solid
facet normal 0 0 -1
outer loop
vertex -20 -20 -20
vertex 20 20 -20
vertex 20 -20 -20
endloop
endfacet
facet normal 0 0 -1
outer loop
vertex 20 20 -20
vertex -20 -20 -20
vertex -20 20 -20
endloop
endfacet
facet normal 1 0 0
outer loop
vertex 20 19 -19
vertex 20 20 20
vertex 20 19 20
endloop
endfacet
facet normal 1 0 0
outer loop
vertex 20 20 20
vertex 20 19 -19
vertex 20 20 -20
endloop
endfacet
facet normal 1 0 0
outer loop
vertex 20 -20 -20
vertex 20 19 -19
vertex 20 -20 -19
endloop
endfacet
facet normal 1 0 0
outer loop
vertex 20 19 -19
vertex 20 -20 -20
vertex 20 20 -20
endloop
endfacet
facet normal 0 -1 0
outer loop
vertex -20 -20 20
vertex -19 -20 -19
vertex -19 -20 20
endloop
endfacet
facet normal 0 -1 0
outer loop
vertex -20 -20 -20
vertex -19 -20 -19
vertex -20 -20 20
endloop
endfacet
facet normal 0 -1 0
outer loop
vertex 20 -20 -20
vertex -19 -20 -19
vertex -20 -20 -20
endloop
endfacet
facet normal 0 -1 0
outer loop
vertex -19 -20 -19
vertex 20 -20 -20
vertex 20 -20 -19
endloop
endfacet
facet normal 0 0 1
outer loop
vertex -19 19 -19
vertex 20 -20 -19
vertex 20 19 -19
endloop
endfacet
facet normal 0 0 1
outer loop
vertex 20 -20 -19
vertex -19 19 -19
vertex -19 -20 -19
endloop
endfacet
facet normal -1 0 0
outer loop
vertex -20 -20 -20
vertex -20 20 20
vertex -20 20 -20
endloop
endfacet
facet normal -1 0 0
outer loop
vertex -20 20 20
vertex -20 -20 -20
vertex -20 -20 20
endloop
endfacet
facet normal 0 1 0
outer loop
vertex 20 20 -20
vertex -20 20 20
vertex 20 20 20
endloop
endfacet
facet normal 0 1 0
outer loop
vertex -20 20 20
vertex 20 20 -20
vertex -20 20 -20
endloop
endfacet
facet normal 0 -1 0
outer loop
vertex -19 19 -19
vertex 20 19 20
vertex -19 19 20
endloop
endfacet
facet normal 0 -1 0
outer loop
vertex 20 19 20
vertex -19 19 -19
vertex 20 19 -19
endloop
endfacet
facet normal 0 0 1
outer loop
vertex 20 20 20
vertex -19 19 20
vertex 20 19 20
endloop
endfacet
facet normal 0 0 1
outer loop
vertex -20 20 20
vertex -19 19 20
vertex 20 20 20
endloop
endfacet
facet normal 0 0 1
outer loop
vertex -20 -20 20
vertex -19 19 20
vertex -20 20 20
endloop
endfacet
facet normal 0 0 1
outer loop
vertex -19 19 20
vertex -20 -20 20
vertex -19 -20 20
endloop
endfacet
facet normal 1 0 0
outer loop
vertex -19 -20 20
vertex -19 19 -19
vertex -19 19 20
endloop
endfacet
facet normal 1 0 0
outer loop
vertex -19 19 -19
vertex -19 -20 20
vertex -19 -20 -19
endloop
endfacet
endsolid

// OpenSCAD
// font = "Liberation Sans";
// Nicer, but not generally installed:
// font = "Bank Gothic";



color("MediumOrchid") 
  translate([0,0,-20])
    linear_extrude(1) 
      difference() {
        square(40, center=true);
        projection();
      }

color("DarkMagenta")
  rotate([90,0,0]) 
    translate([0,0,-20])
      linear_extrude(1) 
        difference() {
          translate([0,0.5]) square([40,39], center=true);
          projection() rotate([-90,0,0]);
        }

color("MediumSlateBlue")
  rotate([90,0,90]) 
    translate([0,0,-20])
      linear_extrude(1)
        difference() {
          translate([-0.5,0.5]) square([39,39], center=true);
          projection() rotate([0,-90,-90]);
        }
